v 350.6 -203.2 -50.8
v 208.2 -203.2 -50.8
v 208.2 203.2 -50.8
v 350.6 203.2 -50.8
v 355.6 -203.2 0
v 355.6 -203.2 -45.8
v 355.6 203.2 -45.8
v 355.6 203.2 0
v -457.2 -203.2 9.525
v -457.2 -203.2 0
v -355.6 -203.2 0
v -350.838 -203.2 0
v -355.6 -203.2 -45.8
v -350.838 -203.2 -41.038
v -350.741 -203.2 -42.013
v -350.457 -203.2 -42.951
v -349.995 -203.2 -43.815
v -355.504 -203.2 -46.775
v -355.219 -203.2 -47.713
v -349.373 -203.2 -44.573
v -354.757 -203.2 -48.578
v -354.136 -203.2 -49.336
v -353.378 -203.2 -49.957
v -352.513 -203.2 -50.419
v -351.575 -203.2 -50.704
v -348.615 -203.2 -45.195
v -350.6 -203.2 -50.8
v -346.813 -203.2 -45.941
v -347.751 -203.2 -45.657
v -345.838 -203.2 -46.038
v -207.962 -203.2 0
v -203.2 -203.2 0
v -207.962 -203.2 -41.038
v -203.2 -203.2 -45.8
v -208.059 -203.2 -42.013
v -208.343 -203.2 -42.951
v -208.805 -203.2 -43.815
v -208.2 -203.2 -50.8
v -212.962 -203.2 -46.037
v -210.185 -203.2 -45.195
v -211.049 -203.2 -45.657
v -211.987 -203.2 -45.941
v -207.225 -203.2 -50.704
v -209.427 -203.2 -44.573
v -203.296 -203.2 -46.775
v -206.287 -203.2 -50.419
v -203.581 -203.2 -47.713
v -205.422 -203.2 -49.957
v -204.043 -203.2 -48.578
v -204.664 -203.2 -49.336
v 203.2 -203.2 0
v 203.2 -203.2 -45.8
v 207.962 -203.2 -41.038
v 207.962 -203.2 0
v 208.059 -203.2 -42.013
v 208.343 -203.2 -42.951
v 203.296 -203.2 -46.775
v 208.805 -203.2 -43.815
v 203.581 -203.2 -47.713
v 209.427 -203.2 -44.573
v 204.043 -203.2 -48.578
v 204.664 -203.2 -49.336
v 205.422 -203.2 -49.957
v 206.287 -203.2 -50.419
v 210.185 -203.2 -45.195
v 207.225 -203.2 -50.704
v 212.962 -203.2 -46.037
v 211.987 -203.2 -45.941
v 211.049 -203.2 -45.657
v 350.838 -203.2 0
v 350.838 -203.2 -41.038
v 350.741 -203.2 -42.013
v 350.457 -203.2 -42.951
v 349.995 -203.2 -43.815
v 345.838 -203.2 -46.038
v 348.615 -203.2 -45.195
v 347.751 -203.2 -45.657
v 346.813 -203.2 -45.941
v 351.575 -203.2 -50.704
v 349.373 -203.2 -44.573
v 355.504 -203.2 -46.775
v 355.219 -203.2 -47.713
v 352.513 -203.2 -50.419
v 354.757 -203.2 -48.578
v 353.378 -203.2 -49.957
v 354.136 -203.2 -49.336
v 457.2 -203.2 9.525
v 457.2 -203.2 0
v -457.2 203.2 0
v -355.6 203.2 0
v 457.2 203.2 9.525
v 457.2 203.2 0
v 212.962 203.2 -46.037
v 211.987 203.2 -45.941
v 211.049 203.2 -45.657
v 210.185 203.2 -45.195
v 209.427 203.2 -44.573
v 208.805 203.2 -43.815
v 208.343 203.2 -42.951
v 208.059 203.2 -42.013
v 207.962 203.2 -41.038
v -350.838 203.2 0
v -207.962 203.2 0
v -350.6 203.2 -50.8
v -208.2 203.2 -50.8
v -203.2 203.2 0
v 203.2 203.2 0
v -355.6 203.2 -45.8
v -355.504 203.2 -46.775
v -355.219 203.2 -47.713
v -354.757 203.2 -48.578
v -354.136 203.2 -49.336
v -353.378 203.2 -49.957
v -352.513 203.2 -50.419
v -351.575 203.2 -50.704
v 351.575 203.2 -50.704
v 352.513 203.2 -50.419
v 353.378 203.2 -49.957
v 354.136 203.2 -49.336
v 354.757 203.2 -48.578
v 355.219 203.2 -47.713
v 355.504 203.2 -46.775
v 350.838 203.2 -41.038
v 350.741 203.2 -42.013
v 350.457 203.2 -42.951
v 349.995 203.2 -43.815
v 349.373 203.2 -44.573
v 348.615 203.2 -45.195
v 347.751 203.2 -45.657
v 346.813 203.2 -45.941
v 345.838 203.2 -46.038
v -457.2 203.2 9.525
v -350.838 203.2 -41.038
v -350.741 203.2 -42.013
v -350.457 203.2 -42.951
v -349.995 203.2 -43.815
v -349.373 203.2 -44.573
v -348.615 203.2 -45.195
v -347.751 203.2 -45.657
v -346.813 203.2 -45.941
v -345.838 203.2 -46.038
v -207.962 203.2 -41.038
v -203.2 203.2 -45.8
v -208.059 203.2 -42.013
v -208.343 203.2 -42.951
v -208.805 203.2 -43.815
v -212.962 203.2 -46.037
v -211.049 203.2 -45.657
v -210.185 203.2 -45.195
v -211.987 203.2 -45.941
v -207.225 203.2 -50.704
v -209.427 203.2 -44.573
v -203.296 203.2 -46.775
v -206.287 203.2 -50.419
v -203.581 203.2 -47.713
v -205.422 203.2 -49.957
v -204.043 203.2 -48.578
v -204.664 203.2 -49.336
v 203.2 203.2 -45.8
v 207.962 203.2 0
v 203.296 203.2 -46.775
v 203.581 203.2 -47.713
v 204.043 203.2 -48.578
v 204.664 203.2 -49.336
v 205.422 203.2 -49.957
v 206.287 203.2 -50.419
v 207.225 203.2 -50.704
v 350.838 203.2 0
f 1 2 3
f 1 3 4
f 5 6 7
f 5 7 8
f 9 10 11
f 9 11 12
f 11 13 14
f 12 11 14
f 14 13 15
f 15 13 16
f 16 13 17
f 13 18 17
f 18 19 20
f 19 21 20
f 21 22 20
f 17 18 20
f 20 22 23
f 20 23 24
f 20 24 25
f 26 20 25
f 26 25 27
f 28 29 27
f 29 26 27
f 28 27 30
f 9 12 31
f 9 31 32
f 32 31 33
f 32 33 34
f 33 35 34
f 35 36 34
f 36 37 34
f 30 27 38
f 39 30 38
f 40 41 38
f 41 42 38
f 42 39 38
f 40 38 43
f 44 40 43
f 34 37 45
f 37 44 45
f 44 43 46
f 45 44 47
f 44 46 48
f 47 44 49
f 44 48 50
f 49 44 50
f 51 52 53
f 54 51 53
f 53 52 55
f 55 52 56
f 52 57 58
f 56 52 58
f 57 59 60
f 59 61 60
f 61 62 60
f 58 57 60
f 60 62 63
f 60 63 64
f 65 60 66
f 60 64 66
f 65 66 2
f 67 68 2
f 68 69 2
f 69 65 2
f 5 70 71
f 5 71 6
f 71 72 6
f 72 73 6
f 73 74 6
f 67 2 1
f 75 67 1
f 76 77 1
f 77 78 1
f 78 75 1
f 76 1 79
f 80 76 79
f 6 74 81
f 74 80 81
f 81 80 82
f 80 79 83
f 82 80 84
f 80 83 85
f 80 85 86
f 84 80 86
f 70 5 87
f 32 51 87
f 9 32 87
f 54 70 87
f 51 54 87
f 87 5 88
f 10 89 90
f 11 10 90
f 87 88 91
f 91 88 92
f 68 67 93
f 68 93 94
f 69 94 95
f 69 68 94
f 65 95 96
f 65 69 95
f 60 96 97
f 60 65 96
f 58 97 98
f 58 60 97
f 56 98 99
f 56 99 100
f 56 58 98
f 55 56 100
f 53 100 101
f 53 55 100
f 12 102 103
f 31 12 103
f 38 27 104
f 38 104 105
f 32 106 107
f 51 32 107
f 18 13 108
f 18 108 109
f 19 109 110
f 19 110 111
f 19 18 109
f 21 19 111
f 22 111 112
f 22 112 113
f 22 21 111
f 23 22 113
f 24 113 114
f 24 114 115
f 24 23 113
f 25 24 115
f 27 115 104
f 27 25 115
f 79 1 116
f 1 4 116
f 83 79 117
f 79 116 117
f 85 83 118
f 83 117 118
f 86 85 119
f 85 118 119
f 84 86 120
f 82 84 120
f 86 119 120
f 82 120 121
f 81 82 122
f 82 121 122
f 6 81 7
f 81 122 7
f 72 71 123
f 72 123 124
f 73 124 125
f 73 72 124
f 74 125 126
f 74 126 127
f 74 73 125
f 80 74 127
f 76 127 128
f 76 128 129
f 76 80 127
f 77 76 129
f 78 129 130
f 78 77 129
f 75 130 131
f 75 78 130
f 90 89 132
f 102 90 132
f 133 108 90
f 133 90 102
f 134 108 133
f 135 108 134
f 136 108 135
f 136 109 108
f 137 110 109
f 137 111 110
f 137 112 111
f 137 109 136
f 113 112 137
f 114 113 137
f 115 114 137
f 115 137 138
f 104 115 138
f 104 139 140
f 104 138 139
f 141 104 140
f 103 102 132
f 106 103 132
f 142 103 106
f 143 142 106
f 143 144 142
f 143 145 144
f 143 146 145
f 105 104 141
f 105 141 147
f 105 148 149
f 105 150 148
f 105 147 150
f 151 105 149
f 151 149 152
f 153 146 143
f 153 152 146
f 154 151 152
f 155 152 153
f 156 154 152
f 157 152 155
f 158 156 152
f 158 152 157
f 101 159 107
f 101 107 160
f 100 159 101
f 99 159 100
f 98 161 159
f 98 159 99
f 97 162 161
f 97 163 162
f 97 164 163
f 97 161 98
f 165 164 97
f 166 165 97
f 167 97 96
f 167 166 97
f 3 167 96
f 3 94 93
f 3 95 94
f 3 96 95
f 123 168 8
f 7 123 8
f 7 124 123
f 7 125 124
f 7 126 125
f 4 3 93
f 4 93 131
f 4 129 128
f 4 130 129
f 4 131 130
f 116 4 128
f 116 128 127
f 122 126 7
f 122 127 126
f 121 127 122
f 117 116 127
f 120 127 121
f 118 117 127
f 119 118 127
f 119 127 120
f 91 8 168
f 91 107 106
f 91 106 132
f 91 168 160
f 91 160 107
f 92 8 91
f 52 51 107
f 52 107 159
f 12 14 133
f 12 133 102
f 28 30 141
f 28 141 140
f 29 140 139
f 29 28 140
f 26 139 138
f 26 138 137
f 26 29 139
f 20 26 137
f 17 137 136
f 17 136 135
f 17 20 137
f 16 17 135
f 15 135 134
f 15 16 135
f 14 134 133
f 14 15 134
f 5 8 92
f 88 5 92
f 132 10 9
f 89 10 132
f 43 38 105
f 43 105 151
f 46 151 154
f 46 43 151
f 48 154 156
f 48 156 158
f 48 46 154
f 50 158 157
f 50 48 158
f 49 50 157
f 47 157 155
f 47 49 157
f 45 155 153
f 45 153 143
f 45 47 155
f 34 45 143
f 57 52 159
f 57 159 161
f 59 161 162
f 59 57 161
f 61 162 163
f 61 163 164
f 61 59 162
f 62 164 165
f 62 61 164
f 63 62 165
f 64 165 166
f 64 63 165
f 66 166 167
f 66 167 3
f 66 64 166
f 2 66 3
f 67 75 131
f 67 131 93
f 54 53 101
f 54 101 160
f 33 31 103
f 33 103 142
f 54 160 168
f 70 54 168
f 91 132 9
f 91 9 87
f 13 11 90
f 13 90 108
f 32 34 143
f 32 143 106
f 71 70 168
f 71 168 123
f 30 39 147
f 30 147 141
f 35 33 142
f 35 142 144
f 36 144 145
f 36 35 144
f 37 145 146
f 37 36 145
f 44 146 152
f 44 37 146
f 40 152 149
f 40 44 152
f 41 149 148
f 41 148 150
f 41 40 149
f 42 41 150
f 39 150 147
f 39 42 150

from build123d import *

# Parameters (mm, degrees)
F0_W     = 914.4
F0_H     = 406.4
F1_DEPTH = 9.525
F3_DEPTH = 406.4
F4_R     = 5


with BuildPart() as f1:
    # F0 (on Top) → F1 (new body)
    with BuildSketch(Plane.XY):
        Rectangle(F0_W, F0_H)
    extrude(amount=F1_DEPTH)

    # F2 (on face) → F3 (join, through all)
    with BuildSketch(Plane.XZ.offset(203.2)):
        with BuildLine():
            Line((-350.8375, 0), (-355.6, 0))
            Line((-355.6, 0), (-355.6, -45.8))
            ThreePointArc((-355.6, -45.8), (-354.135534, -49.335534), (-350.6, -50.8))
            Line((-350.6, -50.8), (-208.2, -50.8))
            ThreePointArc((-208.2, -50.8), (-204.664466, -49.335534), (-203.2, -45.8))
            Line((-203.2, -45.8), (-203.2, 0))
            Line((-203.2, 0), (-207.9625, 0))
            Line((-207.9625, 0), (-207.9625, -41.0375))
            ThreePointArc((-207.9625, -41.0375), (-209.426966, -44.573034), (-212.9625, -46.0375))
            Line((-212.9625, -46.0375), (-345.8375, -46.0375))
            ThreePointArc((-345.8375, -46.0375), (-349.373034, -44.573034), (-350.8375, -41.0375))
            Line((-350.8375, -41.0375), (-350.8375, 0))
        make_face()
        with BuildLine():
            Line((207.9625, 0), (203.2, 0))
            Line((203.2, 0), (203.2, -45.8))
            ThreePointArc((203.2, -45.8), (204.664466, -49.335534), (208.2, -50.8))
            Line((208.2, -50.8), (355.6, -50.8))
            Line((355.6, -50.8), (355.6, 0))
            Line((355.6, 0), (350.8375, 0))
            Line((350.8375, 0), (350.8375, -41.0375))
            ThreePointArc((350.8375, -41.0375), (349.373034, -44.573034), (345.8375, -46.0375))
            Line((345.8375, -46.0375), (212.9625, -46.0375))
            ThreePointArc((212.9625, -46.0375), (209.426966, -44.573034), (207.9625, -41.0375))
            Line((207.9625, -41.0375), (207.9625, 0))
        make_face()
    extrude(amount=-F3_DEPTH)

    # F4
    f4_edges = [f1.edges().sort_by_distance(p)[0] for p in [
        (355.6, 0, -50.8),
    ]]
    fillet(f4_edges, radius=F4_R)


solid = f1.part
